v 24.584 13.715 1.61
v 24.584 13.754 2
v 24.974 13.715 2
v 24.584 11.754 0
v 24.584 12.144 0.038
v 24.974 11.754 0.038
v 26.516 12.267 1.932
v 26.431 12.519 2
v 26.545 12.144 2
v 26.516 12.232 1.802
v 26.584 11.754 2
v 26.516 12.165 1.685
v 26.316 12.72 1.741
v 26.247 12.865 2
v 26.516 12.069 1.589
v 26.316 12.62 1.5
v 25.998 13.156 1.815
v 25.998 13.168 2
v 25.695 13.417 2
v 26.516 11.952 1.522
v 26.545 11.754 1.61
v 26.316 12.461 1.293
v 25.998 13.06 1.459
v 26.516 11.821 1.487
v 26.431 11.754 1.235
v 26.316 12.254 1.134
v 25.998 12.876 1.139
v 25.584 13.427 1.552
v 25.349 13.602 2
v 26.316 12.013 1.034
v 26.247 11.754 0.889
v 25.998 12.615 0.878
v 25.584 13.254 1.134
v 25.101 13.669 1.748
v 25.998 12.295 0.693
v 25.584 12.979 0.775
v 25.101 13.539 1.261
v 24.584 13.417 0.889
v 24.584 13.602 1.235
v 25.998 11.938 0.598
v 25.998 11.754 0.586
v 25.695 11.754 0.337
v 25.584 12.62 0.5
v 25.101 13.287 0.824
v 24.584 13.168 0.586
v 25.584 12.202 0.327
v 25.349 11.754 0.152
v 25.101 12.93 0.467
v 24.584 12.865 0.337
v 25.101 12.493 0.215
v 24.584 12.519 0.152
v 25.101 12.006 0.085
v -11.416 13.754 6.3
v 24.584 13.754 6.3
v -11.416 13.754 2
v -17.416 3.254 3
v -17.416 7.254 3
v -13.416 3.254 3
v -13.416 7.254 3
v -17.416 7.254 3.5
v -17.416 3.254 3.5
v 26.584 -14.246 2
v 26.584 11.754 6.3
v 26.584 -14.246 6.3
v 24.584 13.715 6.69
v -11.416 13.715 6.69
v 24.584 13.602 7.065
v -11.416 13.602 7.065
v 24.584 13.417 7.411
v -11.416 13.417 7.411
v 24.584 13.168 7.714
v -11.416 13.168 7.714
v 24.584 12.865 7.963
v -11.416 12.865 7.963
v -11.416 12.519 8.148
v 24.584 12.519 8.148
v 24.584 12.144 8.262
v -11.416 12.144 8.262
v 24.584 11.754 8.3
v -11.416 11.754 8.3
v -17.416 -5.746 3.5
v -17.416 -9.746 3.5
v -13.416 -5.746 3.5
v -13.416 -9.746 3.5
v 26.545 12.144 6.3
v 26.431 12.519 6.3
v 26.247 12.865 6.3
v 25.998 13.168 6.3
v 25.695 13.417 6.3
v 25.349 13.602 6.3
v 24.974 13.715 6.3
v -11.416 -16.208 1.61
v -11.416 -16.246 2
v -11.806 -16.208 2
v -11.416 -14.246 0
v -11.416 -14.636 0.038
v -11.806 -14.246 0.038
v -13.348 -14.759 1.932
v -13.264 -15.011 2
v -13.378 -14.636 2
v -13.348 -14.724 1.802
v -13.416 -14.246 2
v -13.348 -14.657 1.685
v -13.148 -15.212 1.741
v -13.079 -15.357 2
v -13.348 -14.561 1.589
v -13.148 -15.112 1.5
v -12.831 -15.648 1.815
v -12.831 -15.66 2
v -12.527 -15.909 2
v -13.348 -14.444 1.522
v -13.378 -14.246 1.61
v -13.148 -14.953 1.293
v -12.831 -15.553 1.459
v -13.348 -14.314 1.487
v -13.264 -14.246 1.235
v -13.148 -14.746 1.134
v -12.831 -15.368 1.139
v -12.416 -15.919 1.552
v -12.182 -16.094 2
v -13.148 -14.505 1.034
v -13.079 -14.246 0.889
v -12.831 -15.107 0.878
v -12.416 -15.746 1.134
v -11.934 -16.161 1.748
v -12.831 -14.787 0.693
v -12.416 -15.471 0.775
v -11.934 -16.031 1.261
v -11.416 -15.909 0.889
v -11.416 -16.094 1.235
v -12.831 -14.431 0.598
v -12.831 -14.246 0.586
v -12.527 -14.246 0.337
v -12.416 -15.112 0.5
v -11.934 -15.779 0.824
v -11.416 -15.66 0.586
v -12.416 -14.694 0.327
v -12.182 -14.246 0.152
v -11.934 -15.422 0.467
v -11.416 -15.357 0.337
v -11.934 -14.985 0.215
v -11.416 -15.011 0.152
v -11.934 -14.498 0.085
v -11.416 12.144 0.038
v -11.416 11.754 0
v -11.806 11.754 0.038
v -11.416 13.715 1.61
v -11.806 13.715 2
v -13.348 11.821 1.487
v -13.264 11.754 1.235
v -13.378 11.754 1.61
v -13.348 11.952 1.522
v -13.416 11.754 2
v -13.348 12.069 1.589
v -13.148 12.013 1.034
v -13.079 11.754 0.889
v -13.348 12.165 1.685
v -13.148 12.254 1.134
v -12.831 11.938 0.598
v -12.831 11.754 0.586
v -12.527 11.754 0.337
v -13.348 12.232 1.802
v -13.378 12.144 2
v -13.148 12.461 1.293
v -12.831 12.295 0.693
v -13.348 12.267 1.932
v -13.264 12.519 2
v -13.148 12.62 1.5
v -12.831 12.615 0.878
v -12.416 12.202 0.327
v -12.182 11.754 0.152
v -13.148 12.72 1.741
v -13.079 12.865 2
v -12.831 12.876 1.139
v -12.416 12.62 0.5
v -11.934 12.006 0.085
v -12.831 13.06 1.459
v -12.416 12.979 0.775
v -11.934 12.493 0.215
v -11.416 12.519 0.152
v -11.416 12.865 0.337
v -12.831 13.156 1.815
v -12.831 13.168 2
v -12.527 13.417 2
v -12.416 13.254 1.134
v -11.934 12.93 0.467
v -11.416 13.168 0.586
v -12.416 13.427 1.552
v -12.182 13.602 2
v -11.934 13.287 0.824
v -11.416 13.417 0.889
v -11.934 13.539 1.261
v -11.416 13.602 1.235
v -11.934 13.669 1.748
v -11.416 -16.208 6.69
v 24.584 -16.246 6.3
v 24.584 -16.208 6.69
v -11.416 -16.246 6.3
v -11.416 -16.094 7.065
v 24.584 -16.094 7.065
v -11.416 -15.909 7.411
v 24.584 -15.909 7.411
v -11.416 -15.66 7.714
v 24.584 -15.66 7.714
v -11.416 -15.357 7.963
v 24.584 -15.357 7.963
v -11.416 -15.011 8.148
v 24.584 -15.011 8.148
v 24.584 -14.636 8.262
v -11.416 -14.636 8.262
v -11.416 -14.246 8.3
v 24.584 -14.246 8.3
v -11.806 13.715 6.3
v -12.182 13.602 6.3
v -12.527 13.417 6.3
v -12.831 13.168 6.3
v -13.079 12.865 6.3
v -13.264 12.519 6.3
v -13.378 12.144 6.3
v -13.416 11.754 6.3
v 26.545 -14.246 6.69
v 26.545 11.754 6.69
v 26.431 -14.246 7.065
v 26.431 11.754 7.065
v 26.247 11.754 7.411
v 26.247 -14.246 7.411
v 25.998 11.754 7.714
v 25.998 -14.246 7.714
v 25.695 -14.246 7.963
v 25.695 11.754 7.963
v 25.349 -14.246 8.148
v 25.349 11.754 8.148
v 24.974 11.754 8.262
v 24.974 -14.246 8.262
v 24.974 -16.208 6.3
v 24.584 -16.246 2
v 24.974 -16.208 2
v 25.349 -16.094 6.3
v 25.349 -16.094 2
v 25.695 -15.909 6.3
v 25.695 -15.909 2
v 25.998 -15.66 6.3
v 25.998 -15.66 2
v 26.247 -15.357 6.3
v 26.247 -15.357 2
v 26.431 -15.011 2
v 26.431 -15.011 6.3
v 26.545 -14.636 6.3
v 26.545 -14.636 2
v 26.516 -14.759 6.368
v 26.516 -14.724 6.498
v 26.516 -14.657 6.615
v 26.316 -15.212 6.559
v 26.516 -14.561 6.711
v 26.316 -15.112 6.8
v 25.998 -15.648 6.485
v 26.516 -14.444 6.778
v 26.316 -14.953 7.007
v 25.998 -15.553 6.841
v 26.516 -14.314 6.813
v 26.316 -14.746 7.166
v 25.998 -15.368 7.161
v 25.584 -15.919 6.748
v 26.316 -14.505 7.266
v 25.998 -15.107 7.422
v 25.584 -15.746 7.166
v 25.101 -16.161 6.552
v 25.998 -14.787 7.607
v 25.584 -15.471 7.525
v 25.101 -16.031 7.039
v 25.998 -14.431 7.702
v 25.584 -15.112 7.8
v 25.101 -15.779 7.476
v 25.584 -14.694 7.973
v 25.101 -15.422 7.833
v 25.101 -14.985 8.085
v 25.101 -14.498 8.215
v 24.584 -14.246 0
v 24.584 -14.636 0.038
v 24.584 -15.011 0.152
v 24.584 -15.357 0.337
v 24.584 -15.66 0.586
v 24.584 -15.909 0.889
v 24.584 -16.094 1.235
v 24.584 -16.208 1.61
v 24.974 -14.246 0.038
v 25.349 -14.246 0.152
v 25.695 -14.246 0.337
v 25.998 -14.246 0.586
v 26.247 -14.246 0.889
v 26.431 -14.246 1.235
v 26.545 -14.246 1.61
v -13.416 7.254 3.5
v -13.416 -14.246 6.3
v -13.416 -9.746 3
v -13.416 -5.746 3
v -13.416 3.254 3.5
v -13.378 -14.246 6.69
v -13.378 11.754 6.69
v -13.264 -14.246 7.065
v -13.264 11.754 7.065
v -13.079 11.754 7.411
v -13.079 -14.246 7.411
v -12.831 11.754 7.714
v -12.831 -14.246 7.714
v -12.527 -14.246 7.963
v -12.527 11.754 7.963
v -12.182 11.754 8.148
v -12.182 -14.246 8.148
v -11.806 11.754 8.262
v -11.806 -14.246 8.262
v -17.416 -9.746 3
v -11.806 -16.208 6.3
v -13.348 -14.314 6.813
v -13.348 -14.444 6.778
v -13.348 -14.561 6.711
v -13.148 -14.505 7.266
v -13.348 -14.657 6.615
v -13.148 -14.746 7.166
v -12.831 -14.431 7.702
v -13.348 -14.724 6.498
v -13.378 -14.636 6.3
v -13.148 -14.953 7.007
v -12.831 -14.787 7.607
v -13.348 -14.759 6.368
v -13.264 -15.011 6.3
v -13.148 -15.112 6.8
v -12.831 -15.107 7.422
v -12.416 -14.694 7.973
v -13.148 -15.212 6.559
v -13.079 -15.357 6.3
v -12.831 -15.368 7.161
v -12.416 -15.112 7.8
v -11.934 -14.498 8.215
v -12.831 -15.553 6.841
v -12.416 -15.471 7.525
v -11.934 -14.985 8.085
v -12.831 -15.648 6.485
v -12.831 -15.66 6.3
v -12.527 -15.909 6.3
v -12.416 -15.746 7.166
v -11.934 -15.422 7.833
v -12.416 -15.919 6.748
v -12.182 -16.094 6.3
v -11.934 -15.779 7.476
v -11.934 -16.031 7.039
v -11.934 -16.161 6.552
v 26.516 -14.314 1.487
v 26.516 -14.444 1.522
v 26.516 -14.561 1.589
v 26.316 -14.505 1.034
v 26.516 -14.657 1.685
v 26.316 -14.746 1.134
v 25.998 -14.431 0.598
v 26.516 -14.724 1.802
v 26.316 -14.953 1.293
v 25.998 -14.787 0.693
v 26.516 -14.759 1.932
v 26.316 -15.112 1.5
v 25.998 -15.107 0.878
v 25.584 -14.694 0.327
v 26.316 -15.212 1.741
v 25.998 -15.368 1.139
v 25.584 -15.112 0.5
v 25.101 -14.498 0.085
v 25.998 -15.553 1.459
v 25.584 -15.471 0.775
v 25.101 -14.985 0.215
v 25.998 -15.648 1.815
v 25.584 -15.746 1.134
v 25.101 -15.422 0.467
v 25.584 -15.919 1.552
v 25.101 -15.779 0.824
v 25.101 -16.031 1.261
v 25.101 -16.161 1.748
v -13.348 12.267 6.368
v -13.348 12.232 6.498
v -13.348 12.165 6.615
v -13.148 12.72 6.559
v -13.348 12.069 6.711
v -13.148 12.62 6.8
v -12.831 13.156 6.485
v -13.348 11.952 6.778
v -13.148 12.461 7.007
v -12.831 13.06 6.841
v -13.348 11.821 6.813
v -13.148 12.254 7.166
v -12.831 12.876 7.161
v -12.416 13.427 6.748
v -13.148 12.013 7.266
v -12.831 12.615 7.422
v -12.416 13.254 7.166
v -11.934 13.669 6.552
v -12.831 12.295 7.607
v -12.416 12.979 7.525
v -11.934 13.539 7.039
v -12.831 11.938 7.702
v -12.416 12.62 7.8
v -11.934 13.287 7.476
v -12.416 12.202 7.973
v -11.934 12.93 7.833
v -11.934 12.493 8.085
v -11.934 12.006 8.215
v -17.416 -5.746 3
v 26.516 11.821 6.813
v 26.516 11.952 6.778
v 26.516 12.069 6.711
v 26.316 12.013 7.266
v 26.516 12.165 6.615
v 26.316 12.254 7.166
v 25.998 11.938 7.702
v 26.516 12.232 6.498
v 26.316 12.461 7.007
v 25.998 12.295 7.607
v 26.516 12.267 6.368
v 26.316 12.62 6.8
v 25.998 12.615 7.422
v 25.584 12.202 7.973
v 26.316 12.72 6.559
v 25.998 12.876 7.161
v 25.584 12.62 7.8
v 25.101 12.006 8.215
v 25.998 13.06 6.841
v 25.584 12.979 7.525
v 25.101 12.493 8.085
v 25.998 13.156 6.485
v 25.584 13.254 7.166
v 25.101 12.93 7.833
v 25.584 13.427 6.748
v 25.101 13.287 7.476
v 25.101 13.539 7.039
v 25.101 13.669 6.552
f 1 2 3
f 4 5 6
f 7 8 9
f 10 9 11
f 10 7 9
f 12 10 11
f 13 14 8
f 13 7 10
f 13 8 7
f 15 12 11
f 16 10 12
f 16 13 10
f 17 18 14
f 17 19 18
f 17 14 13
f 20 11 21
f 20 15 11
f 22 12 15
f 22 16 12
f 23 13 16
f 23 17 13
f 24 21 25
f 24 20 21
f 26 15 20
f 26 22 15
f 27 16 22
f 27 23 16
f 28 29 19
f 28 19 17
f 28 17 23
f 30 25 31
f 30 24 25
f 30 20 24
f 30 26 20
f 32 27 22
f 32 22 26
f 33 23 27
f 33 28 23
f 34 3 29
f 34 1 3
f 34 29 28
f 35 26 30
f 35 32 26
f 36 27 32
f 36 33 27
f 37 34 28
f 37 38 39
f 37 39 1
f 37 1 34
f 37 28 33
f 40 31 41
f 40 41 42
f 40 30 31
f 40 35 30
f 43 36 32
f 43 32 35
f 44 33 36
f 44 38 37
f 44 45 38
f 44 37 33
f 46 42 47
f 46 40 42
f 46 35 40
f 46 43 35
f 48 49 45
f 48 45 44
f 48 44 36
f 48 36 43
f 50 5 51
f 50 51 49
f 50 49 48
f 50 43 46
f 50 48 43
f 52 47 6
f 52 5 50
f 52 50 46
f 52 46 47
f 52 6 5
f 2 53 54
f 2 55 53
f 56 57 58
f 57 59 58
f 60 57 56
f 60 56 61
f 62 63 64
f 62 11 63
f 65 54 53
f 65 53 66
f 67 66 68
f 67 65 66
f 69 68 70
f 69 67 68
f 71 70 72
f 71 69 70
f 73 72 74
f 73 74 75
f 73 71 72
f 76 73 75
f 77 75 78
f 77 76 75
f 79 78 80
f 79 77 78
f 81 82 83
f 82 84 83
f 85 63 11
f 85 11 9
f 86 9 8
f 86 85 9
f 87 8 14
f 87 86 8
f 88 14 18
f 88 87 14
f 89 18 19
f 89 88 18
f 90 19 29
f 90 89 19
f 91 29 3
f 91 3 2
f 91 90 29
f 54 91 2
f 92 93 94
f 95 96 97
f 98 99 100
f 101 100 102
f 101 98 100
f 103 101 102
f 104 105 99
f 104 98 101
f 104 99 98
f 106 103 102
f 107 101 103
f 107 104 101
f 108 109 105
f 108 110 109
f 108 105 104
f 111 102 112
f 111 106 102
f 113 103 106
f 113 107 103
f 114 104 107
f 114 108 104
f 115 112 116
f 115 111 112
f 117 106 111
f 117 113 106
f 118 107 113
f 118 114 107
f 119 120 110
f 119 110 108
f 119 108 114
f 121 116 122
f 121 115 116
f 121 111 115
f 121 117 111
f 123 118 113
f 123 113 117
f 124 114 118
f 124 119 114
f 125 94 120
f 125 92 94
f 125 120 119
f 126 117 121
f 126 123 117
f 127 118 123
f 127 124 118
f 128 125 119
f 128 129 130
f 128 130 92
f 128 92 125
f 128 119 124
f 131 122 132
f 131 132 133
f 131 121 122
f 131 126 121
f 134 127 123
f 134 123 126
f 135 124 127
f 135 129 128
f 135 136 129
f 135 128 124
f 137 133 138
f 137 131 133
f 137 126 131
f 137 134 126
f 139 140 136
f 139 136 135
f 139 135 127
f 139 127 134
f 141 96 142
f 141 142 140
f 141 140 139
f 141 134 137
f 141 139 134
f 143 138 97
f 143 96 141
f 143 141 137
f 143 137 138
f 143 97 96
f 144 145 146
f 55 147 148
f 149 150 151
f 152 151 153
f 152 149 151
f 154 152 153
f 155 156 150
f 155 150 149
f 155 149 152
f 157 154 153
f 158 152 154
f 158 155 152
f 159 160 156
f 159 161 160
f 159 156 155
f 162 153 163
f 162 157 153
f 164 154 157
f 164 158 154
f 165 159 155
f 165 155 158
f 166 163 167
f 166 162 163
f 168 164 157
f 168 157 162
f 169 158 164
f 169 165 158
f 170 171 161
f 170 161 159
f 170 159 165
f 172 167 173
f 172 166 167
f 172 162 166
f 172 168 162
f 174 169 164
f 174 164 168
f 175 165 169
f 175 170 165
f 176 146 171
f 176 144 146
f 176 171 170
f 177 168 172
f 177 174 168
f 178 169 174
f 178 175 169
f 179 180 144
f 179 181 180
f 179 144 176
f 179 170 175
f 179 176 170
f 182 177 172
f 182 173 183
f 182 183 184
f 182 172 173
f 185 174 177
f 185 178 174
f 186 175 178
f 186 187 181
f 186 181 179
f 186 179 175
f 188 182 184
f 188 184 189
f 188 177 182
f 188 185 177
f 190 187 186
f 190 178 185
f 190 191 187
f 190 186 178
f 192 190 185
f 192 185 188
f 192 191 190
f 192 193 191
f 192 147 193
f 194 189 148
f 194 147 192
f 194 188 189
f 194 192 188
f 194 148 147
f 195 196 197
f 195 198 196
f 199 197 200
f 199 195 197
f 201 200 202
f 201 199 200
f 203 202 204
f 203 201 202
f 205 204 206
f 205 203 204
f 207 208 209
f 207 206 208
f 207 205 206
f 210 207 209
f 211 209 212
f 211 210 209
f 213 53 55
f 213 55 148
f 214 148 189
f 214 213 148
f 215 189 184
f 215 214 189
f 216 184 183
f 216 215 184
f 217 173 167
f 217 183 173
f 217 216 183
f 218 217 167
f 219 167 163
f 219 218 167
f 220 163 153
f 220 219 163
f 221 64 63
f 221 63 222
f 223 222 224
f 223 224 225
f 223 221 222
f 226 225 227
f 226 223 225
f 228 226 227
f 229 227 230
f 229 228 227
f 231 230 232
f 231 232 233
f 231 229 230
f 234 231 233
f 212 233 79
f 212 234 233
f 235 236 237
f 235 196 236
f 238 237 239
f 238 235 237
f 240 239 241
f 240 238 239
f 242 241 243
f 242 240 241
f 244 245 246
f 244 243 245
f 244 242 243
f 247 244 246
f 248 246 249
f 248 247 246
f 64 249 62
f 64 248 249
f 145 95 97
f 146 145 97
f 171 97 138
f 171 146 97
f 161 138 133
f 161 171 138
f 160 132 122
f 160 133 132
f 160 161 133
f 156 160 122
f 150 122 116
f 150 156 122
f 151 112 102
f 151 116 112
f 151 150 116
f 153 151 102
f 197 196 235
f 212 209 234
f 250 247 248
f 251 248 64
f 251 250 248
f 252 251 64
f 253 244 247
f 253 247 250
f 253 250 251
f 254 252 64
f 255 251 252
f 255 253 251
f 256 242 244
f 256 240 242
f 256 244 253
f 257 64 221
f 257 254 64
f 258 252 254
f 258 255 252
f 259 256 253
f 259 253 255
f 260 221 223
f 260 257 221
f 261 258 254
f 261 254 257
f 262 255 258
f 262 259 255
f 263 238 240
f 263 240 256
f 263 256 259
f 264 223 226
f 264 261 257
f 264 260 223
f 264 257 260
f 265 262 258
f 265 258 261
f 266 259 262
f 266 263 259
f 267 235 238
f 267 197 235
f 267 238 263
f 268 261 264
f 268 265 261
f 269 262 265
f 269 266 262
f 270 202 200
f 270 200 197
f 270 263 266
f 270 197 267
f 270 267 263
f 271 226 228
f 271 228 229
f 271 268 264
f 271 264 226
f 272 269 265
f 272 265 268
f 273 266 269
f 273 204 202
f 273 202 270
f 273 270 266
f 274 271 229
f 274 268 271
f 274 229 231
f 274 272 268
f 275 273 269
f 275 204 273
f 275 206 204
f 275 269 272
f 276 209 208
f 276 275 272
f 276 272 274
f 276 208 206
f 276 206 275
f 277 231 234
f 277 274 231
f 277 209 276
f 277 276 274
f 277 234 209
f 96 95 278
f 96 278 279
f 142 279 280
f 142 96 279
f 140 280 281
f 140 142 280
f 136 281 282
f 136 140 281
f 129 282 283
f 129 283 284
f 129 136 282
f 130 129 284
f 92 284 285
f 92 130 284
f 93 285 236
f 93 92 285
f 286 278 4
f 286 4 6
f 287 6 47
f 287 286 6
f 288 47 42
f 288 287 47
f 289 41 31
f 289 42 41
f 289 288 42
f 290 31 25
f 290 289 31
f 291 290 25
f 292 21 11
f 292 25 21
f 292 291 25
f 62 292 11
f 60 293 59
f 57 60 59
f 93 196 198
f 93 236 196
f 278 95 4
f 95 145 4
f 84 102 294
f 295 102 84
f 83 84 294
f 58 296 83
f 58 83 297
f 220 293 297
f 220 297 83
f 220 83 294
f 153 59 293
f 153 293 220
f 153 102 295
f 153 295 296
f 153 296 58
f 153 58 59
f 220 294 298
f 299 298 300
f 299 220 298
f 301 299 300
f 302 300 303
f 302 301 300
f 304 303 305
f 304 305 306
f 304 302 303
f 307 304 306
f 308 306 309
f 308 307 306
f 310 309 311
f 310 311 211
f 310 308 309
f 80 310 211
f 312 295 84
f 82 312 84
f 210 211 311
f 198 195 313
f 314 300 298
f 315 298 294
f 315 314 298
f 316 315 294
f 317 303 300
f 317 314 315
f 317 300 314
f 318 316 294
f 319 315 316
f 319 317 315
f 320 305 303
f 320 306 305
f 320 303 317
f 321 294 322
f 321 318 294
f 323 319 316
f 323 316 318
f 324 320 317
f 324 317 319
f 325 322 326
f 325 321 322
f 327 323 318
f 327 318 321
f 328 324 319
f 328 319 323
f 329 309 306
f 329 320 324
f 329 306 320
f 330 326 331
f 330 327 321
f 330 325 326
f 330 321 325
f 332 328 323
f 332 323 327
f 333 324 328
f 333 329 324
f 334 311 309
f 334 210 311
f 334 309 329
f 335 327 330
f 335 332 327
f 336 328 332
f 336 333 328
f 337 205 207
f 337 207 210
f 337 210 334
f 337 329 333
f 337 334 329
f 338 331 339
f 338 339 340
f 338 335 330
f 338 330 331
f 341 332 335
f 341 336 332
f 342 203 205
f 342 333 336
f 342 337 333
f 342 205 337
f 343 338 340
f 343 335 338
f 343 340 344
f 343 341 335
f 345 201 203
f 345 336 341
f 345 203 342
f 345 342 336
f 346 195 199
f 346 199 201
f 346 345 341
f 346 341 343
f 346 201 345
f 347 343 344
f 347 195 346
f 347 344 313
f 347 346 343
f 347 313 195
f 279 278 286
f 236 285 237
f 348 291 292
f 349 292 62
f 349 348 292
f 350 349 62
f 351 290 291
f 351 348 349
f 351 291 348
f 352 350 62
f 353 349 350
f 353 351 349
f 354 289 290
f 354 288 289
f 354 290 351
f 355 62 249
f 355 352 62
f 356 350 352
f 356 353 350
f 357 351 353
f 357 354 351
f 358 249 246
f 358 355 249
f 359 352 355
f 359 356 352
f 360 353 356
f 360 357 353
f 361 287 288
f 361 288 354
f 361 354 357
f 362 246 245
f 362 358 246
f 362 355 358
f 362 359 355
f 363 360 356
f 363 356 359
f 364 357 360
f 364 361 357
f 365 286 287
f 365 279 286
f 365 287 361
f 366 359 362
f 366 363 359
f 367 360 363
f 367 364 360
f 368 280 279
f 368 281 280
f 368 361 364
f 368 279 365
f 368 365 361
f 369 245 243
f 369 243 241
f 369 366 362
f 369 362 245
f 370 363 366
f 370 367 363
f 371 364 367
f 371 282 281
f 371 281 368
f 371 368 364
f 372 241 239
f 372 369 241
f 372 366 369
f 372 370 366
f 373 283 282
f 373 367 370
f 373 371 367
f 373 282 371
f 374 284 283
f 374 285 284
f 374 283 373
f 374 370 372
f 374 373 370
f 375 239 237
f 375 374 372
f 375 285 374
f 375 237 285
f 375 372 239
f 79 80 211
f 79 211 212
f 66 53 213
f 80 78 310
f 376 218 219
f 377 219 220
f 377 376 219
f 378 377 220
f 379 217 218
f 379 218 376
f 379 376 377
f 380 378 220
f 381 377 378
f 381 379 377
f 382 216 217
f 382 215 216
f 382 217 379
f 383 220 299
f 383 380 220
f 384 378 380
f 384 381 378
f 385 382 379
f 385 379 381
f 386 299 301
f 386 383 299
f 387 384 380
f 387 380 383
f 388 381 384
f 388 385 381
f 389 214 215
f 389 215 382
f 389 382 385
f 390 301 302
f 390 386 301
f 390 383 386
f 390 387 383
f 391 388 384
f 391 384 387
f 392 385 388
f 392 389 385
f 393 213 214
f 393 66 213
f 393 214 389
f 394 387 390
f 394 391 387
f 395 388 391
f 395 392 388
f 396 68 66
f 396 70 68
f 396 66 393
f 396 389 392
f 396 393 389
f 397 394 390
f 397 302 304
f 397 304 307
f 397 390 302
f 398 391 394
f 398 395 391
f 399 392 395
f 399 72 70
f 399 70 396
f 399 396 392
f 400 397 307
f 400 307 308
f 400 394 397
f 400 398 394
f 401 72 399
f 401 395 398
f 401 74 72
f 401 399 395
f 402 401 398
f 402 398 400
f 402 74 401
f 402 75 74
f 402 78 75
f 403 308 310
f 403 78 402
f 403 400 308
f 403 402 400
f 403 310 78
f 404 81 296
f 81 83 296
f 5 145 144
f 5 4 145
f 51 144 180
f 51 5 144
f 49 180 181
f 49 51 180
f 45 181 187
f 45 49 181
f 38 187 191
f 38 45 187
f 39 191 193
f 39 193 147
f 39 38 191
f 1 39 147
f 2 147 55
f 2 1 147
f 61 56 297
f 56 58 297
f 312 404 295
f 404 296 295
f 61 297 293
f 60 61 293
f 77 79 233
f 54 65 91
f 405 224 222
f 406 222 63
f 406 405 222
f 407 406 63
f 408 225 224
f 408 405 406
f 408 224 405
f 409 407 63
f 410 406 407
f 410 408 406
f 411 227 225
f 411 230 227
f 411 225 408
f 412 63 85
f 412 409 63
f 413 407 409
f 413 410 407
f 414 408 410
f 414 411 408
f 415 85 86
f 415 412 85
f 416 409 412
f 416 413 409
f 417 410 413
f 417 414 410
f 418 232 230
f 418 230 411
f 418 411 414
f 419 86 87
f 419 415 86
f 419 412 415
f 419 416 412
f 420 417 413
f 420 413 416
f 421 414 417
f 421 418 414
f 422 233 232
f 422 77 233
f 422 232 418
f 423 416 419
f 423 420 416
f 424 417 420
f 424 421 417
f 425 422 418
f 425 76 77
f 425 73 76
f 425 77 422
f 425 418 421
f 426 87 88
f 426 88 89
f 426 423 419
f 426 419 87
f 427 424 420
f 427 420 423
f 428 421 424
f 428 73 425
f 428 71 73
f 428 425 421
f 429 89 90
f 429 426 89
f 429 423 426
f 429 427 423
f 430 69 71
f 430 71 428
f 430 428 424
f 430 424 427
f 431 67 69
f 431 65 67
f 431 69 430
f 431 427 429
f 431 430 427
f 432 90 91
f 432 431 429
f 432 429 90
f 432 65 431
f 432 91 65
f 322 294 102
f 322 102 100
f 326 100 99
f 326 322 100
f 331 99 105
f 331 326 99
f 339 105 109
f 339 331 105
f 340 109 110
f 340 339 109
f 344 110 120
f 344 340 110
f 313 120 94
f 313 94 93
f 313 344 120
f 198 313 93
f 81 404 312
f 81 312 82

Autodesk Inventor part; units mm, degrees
ref_plane "YZ Plane" through (0, 0, 0) normal (1, 0, 0) x (0, 1, 0)
ref_plane "XZ Plane" through (0, 0, 0) normal (0, 1, 0) x (-1, 0, 0)
ref_plane "XY Plane" through (0, 0, 0) normal (0, 0, 1) x (1, 0, 0)
sketch "Эскиз1" plane through (0, 0, 0) normal (0, 0, 1) x (1, 0, 0)
  line L0 (-13.4163, 13.7539) -> (26.5837, 13.7539)
  line L1 (26.5837, 13.7539) -> (26.5837, -16.2461)
  line L2 (26.5837, -16.2461) -> (-13.4163, -16.2461)
  line L3 (-13.4163, -16.2461) -> (-13.4163, 13.7539)
  point P0 (0, 0)
  dimension "d0" = 40
  dimension "d1" = 30
extrude "Выдавливание1" add sketch "Эскиз1" along normal blind 8.3
sketch "Эскиз2" plane through (-13.4163, -16.2461, 0) normal (-1, 0, 0) x (0, 0, 1)
  line L0 (3, 6.5) -> (3.5, 6.5)
  line L1 (3.5, 6.5) -> (3.5, 10.5)
  line L2 (3.5, 10.5) -> (3, 10.5)
  line L3 (3, 10.5) -> (3, 6.5)
  line L4 (3, 19.5) -> (3.5, 19.5)
  line L5 (3.5, 19.5) -> (3.5, 23.5)
  line L6 (3.5, 23.5) -> (3, 23.5)
  line L7 (3, 23.5) -> (3, 19.5)
  line L8 (0, 0) -> (8.3, 0) projected
  line L9 (0, 30) -> (0, 0) projected
  point P0 (0, 16.2461)
  dimension "d4" = 4
  dimension "d5" = 4
  dimension "d6" = 0.5
  dimension "d7" = 0.5
  dimension "d8" = 9
  dimension "d9" = 6.5
  dimension "d10" = 3
extrude "Выдавливание2" add sketch "Эскиз2" along normal blind 4
fillet "Сопряжение1" radius 2 12 edges at (6.5837, 13.7539, 8.3) (6.5837, 13.7539, 0) (6.5837, -16.2461, 8.3) (6.5837, -16.2461, 0) (26.5837, -1.2461, 0) (26.5837, -1.2461, 8.3) (26.5837, -16.2461, 4.15) (-13.4163, -1.2461, 0) (-13.4163, -16.2461, 4.15) (-13.4163, 13.7539, 4.15) (-13.4163, -1.2461, 8.3) (26.5837, 13.7539, 4.15)
properties part number "803048" material "Алюминий 6061"
